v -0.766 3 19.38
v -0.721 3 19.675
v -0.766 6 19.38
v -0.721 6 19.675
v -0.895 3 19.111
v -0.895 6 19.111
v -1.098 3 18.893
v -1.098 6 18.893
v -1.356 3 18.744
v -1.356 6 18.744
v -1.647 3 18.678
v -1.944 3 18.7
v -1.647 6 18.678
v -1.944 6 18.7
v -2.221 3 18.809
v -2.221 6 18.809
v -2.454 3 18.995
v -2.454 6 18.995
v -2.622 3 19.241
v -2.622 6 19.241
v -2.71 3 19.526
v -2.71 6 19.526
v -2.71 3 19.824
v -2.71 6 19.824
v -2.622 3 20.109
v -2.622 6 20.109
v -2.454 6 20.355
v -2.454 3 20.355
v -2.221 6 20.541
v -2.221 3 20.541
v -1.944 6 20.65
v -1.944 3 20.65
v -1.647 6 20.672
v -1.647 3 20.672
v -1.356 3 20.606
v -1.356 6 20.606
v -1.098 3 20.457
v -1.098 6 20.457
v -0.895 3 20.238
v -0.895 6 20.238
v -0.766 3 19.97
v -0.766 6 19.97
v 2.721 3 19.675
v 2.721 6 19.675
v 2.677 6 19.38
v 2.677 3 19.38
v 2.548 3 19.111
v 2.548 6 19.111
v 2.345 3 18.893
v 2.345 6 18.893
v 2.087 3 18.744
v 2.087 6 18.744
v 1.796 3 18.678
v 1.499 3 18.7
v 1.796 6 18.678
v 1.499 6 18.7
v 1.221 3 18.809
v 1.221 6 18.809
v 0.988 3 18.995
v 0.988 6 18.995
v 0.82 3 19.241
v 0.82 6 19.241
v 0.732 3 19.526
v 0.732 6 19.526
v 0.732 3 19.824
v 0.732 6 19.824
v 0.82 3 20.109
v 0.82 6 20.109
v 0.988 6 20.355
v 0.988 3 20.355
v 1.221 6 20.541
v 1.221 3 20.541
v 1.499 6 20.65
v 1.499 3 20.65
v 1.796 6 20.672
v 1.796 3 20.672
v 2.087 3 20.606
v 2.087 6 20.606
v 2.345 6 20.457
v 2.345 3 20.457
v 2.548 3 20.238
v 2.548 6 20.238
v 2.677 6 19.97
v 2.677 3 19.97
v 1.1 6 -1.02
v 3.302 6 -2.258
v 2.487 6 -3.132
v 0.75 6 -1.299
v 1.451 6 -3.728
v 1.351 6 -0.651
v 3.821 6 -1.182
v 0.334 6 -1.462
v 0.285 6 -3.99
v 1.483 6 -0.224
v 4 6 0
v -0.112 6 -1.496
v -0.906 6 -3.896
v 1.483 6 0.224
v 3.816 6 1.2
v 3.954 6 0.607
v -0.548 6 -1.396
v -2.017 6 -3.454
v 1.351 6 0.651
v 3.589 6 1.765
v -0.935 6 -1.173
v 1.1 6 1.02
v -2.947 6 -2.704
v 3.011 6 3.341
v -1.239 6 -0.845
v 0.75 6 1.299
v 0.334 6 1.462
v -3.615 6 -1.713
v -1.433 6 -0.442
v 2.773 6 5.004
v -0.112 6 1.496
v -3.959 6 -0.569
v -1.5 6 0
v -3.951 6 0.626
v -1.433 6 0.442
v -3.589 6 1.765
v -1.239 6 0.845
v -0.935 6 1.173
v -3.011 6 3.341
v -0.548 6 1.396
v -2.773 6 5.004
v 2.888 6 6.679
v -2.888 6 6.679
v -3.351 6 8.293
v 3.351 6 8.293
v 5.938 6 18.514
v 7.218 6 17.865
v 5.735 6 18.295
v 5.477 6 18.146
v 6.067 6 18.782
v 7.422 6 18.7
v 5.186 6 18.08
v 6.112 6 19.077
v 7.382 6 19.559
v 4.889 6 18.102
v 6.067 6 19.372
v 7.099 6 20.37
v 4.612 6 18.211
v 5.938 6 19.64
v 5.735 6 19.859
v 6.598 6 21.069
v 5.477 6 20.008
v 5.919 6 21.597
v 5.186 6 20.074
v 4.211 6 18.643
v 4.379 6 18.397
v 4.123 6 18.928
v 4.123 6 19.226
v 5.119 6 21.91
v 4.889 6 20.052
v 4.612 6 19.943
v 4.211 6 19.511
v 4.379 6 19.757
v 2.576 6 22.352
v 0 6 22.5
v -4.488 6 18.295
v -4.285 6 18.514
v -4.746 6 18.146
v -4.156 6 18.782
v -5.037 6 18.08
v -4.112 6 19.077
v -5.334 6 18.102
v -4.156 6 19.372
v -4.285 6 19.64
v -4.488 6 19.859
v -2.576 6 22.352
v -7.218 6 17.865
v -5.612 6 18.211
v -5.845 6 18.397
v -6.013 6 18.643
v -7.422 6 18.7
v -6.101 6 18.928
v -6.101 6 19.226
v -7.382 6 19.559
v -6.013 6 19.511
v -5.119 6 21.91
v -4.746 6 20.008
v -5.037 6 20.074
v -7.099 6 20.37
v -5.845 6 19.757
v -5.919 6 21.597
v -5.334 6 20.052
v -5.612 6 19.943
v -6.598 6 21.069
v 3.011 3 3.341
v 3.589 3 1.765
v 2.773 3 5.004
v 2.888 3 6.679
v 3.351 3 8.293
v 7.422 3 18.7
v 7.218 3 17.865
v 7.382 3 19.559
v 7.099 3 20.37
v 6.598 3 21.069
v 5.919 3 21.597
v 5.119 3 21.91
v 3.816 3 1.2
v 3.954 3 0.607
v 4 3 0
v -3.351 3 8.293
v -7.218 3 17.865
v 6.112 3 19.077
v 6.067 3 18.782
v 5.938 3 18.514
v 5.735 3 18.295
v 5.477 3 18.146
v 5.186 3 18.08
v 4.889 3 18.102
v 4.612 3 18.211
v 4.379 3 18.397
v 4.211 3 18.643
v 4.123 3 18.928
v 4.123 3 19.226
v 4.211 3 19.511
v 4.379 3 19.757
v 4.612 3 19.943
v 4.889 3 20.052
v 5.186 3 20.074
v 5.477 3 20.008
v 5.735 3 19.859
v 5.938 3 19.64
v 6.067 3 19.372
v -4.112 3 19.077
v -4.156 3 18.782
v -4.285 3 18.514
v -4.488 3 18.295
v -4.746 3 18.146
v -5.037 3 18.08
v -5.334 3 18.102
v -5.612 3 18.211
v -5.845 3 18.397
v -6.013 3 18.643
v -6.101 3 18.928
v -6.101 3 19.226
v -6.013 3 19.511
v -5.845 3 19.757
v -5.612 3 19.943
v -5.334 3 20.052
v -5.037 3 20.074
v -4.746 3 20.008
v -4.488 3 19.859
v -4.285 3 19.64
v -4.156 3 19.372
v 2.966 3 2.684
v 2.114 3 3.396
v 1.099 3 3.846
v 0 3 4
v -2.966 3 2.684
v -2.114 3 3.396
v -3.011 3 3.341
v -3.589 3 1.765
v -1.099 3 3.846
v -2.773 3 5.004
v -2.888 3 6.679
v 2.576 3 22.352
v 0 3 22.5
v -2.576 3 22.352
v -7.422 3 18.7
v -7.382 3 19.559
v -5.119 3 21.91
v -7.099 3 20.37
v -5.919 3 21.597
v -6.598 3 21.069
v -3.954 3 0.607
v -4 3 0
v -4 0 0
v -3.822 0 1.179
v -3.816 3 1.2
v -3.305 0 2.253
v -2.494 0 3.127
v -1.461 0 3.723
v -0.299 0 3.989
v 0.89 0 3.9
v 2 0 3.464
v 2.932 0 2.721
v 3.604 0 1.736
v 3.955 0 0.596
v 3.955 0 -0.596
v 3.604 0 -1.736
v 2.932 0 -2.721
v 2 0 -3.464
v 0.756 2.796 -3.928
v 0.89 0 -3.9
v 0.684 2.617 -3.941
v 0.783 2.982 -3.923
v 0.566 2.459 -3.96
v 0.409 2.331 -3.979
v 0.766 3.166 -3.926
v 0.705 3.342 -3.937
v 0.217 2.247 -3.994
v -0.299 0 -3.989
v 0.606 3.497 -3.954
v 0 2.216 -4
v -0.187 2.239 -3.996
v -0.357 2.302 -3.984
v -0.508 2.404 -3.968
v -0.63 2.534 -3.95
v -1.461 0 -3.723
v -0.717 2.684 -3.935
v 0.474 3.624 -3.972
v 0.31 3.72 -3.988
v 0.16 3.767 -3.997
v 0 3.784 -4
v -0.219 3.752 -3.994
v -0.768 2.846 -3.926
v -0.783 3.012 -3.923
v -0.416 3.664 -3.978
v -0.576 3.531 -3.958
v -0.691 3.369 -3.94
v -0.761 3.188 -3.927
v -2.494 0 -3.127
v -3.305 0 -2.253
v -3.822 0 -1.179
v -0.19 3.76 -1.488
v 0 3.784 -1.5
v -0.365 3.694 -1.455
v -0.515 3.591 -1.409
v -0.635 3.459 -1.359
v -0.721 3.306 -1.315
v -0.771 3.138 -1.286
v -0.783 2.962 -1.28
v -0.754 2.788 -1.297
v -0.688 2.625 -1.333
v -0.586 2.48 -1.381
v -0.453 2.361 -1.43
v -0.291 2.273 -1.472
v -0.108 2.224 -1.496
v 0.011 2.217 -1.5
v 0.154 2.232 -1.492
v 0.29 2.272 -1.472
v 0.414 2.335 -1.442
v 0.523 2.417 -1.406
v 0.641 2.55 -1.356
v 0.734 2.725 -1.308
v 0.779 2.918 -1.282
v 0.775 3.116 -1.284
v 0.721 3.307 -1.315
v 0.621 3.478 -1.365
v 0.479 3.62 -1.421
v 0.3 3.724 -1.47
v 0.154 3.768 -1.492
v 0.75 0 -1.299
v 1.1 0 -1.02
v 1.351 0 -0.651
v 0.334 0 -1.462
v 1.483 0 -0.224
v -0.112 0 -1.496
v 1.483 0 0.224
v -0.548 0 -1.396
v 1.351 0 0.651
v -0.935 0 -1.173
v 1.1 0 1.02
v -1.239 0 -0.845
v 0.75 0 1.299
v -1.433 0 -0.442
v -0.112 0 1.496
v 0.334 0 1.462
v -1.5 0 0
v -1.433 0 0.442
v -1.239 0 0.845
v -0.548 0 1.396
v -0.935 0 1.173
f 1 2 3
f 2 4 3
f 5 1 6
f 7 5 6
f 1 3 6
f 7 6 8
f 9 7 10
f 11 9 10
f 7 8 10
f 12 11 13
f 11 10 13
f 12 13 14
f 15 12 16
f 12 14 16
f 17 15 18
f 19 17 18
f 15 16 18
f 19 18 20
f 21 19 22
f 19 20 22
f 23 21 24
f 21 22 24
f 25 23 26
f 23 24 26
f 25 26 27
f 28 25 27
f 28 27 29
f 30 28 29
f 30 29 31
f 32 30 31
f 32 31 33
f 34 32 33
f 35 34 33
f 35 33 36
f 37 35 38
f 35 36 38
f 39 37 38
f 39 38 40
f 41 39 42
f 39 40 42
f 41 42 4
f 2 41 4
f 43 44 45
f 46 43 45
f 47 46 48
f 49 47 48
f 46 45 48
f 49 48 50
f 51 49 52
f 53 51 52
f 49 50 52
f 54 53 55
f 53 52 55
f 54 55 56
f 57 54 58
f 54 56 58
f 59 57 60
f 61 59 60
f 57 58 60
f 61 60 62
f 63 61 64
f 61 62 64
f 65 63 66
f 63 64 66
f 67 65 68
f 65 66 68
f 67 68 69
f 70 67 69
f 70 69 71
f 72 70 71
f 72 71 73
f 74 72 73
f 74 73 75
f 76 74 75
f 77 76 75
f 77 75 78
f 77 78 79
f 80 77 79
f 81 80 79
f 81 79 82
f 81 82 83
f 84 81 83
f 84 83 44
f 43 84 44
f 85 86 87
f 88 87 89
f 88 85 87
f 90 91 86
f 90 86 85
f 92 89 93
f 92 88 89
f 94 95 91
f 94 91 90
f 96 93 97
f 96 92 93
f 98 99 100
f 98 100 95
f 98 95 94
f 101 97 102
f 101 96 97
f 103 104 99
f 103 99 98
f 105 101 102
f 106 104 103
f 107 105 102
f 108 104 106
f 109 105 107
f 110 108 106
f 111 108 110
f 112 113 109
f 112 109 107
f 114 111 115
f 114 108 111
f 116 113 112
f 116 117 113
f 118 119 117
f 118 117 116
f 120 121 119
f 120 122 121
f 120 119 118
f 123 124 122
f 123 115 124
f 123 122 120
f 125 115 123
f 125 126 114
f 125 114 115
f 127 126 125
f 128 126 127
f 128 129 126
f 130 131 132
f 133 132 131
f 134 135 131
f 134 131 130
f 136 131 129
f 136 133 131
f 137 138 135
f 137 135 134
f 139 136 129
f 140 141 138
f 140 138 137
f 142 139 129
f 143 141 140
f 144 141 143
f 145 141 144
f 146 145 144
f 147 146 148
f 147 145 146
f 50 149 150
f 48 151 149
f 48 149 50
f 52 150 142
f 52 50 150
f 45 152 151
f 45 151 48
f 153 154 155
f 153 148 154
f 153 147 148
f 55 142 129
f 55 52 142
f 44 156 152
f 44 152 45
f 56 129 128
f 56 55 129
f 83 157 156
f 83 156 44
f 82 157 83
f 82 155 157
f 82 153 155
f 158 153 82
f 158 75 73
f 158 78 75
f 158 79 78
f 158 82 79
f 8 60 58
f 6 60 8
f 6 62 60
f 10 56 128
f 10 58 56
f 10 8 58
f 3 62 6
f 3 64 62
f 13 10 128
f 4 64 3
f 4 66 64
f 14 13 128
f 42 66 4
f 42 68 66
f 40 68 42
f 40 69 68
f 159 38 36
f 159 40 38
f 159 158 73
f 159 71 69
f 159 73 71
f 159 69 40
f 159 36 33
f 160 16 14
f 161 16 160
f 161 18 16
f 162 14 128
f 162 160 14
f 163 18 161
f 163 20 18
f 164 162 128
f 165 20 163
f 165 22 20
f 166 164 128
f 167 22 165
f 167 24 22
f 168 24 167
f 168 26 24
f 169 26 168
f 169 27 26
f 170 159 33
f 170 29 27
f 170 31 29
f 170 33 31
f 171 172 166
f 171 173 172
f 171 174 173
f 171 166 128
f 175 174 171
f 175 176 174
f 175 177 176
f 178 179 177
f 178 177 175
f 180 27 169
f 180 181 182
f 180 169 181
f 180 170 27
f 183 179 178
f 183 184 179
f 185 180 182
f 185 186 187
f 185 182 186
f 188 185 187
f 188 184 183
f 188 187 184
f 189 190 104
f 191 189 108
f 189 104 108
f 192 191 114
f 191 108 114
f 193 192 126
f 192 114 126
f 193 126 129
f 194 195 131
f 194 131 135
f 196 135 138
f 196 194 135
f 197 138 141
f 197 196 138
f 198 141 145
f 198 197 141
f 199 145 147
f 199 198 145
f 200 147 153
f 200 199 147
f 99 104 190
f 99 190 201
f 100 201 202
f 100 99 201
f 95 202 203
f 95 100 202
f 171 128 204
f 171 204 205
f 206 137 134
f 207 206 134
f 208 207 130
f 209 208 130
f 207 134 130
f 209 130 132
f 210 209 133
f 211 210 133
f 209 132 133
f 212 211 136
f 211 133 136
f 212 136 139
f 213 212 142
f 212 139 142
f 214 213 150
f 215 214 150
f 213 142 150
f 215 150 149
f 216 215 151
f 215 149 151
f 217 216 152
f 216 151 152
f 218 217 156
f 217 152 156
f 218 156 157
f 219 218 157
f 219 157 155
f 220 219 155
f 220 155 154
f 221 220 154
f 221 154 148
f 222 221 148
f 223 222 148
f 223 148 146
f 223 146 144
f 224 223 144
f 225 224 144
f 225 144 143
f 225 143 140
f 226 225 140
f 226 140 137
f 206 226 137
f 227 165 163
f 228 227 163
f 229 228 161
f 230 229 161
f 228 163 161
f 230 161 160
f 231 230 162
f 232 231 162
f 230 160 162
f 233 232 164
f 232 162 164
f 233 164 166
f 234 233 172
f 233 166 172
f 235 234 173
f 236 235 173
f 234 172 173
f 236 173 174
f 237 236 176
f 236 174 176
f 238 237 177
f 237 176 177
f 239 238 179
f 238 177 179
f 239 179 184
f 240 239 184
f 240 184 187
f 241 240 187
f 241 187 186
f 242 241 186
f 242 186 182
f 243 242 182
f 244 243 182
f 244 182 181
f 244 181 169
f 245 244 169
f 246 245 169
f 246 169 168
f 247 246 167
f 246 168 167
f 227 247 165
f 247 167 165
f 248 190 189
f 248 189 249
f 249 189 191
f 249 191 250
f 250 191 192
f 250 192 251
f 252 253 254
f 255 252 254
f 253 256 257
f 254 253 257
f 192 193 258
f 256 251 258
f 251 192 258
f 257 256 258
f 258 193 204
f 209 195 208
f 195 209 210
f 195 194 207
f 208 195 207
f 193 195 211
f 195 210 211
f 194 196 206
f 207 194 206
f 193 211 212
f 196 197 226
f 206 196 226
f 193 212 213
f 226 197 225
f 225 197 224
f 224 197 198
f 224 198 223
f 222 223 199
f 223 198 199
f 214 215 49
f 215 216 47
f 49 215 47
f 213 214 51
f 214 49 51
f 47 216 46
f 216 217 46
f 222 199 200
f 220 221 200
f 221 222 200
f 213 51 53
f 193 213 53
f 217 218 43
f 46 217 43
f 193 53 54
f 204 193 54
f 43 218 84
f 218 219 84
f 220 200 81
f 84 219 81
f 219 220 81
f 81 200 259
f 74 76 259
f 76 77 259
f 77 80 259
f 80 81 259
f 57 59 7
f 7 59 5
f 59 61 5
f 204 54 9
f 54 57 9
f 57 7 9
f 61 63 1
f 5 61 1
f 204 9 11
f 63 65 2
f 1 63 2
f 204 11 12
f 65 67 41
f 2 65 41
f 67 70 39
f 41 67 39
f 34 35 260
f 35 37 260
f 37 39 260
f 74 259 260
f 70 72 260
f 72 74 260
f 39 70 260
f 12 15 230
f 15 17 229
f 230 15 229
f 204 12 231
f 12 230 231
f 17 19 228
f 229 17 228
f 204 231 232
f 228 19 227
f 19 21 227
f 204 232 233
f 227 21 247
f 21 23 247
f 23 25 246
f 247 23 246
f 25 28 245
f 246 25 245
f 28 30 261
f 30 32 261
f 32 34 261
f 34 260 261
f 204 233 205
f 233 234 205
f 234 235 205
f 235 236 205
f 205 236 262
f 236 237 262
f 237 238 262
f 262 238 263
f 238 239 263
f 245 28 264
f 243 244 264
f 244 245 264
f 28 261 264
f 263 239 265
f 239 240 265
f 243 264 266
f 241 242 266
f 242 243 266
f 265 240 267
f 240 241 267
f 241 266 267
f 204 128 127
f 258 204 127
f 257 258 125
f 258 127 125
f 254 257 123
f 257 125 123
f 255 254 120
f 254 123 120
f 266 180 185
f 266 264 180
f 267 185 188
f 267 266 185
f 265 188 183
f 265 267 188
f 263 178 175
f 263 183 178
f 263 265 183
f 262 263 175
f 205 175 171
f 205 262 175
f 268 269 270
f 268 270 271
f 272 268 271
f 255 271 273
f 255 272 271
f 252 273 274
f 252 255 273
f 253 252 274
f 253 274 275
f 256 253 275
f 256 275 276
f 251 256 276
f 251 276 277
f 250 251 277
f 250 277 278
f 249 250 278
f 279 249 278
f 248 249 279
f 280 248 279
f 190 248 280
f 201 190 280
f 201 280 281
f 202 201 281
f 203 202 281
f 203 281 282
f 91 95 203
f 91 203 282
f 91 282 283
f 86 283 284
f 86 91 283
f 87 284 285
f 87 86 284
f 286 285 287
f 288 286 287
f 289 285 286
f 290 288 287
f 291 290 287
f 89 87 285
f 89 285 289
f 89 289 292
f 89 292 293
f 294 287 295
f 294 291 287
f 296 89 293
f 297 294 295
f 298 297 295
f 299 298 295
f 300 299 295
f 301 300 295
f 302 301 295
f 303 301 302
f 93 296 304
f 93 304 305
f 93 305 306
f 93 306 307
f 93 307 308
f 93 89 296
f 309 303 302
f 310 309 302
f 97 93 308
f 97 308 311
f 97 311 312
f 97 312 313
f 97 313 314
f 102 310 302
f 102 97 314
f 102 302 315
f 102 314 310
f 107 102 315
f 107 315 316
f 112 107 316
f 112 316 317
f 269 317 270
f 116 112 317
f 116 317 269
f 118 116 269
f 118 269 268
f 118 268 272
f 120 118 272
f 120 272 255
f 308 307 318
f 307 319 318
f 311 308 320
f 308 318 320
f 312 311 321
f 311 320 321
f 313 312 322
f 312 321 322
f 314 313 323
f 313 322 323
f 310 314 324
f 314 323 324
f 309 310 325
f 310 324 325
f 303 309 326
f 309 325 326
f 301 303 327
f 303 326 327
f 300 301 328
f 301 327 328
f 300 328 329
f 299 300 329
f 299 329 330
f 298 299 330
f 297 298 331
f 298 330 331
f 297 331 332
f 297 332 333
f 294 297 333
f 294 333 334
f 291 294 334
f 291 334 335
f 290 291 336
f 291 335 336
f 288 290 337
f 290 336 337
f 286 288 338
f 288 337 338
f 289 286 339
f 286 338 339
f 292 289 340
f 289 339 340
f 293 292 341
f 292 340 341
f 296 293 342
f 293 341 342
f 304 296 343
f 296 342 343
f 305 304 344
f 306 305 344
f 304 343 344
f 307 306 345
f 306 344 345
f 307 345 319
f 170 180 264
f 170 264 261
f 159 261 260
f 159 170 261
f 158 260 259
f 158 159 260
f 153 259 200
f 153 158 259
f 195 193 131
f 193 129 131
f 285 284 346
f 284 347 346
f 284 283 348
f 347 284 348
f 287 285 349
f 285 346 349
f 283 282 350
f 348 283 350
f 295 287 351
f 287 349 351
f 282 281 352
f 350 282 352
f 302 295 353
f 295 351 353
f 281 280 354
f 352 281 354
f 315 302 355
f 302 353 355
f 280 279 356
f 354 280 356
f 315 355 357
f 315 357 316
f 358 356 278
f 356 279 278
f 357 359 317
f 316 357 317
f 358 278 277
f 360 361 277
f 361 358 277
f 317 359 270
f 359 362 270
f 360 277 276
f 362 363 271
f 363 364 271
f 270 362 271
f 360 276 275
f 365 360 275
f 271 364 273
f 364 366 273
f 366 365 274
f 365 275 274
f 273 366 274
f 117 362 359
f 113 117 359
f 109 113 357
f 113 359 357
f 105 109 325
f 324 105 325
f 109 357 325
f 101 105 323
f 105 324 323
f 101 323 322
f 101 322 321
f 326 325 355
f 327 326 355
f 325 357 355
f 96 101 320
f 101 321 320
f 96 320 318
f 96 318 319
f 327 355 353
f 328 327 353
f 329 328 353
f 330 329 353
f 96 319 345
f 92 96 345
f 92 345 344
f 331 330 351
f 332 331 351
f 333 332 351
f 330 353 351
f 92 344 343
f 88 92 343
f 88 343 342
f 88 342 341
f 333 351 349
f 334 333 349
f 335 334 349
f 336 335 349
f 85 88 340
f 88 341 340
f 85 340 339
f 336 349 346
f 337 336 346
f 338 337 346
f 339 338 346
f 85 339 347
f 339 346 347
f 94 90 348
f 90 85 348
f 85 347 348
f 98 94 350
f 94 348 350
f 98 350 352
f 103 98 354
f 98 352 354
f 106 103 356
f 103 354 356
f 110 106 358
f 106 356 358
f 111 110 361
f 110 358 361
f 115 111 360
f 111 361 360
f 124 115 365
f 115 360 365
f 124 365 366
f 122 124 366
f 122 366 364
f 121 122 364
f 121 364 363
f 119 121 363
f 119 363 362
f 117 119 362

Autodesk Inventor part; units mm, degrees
ref_plane "YZ Plane" through (0, 0, 0) normal (1, 0, 0) x (0, 1, 0)
ref_plane "XZ Plane" through (0, 0, 0) normal (0, 1, 0) x (-1, 0, 0)
sketch "Sketch11" plane through (0, 0, 0) normal (0, 0, 1) x (1, 0, 0)
  line L0 (0, 0) -> (0, 6)
  line L1 (-4, 0) -> (-4, 3)
  line L2 (-4, 3) -> (-22.5, 3)
  line L3 (-22.5, 3) -> (-22.5, 6)
  line L4 (-22.5, 6) -> (-1.5, 6)
  line L5 (-1.5, 6) -> (-1.5, 0)
  line L6 (-1.5, 0) -> (-4, 0)
  dimension "d59" = 3
  dimension "d60" = 6
  dimension "d61" = 3
  dimension "d62" = 45
  dimension "d63" = 2.5
revolve "Revolution3" add sketch "Sketch11" angle 360 about axis through (0, 0, 0) along (0, 1, 0)
sketch "Sketch12" plane through (0, 6, 0) normal (0, 1, 0) x (1, 0, 0)
  circle A0 centre (1.7213, -19.6748) radius 1
  circle A1 centre (-1.7213, -19.6748) radius 1
  circle A2 centre (-5.1117, -19.077) radius 1
  circle A3 centre (5.1117, -19.077) radius 1
  circle A4 centre (0, 0) radius 19.75 construction
  line L0 (0, 0) -> (0, -19.75) construction
  line L1 (0, 0) -> (-1.7213, -19.6748) construction
  line L2 (0, 0) -> (-5.1117, -19.077) construction
  line L3 (0, 0) -> (1.7213, -19.6748) construction
  line L4 (0, 0) -> (5.1117, -19.077) construction
  line L5 (-5.1117, -19.077) -> (-1.7213, -19.6748) construction
  line L6 (-1.7213, -19.6748) -> (1.7213, -19.6748) construction
  dimension "d65" = 2
  dimension "d66" = 2
  dimension "d67" = 2
  dimension "d68" = 2
  dimension "d71" = 5
  dimension "d72" = 10
  dimension "d73" = 10
  dimension "d81" = 39.5
  dimension "d90" = 10.2233
extrude "Extrusion7" cut sketch "Sketch12" against normal through all
sketch "Sketch14" plane through (0, 6, 0) normal (0, 1, 0) x (1, 0, 0)
  circle A0 centre (0, 0) radius 22.5 projected
  line L0 (0, 0) -> (0, -22.5)
  line L1 (0, 0) -> (-8.4286, -20.8616)
  line L2 (0, 0) -> (8.4286, -20.8616)
  circle A1 centre (0, 0) radius 4 projected
  point P0 (1.4984, -3.7087)
  point P1 (-1.4984, -3.7087)
  dimension "d76" = 22
  dimension "d77" = 22
extrude "Extrusion8" cut sketch "Sketch14" against normal through all contours A0 L2 A1 L1
fillet "Fillet3" radius 3 2 edges at (8.4286, 4.5, 20.8616) (-8.4286, 4.5, 20.8616)
fillet "Fillet4" radius 8 2 edges at (1.4984, 4.5, 3.7087) (-1.4984, 4.5, 3.7087)
ref_plane "Work Plane2" through (0, 1.5, -4) normal (0, 0, 1) x (1, 0, 0)
sketch "Sketch15" plane through (0, 1.5, -4) normal (0, 0, 1) x (1, 0, 0)
  line L0 (4, 4.5) -> (-4, 4.5) projected
  line L1 (4, -1.5) -> (4, 4.5) projected
  point P0 (0, -1.5)
  point P1 (0, 1.5)
  point P2 (3.5894, 4.5)
  point P3 (-3.5894, 4.5)
  point P4 (0, 4.5)
  point P5 (4, 1.5)
hole "Hole3" at (0, 3, -4) direction (0, 0, 1) diameter 1.567 depth 4.5 tip angle 118 thread size "M2x0.4" class "6H" standard "ISO Metric profile"
equation "\"d71\" = 0.5 * d72"
equation "\"d73\" = d72"
equation "\"d77\" = d76"
properties part number "023" material "Stainless Steel, Austenitic"
